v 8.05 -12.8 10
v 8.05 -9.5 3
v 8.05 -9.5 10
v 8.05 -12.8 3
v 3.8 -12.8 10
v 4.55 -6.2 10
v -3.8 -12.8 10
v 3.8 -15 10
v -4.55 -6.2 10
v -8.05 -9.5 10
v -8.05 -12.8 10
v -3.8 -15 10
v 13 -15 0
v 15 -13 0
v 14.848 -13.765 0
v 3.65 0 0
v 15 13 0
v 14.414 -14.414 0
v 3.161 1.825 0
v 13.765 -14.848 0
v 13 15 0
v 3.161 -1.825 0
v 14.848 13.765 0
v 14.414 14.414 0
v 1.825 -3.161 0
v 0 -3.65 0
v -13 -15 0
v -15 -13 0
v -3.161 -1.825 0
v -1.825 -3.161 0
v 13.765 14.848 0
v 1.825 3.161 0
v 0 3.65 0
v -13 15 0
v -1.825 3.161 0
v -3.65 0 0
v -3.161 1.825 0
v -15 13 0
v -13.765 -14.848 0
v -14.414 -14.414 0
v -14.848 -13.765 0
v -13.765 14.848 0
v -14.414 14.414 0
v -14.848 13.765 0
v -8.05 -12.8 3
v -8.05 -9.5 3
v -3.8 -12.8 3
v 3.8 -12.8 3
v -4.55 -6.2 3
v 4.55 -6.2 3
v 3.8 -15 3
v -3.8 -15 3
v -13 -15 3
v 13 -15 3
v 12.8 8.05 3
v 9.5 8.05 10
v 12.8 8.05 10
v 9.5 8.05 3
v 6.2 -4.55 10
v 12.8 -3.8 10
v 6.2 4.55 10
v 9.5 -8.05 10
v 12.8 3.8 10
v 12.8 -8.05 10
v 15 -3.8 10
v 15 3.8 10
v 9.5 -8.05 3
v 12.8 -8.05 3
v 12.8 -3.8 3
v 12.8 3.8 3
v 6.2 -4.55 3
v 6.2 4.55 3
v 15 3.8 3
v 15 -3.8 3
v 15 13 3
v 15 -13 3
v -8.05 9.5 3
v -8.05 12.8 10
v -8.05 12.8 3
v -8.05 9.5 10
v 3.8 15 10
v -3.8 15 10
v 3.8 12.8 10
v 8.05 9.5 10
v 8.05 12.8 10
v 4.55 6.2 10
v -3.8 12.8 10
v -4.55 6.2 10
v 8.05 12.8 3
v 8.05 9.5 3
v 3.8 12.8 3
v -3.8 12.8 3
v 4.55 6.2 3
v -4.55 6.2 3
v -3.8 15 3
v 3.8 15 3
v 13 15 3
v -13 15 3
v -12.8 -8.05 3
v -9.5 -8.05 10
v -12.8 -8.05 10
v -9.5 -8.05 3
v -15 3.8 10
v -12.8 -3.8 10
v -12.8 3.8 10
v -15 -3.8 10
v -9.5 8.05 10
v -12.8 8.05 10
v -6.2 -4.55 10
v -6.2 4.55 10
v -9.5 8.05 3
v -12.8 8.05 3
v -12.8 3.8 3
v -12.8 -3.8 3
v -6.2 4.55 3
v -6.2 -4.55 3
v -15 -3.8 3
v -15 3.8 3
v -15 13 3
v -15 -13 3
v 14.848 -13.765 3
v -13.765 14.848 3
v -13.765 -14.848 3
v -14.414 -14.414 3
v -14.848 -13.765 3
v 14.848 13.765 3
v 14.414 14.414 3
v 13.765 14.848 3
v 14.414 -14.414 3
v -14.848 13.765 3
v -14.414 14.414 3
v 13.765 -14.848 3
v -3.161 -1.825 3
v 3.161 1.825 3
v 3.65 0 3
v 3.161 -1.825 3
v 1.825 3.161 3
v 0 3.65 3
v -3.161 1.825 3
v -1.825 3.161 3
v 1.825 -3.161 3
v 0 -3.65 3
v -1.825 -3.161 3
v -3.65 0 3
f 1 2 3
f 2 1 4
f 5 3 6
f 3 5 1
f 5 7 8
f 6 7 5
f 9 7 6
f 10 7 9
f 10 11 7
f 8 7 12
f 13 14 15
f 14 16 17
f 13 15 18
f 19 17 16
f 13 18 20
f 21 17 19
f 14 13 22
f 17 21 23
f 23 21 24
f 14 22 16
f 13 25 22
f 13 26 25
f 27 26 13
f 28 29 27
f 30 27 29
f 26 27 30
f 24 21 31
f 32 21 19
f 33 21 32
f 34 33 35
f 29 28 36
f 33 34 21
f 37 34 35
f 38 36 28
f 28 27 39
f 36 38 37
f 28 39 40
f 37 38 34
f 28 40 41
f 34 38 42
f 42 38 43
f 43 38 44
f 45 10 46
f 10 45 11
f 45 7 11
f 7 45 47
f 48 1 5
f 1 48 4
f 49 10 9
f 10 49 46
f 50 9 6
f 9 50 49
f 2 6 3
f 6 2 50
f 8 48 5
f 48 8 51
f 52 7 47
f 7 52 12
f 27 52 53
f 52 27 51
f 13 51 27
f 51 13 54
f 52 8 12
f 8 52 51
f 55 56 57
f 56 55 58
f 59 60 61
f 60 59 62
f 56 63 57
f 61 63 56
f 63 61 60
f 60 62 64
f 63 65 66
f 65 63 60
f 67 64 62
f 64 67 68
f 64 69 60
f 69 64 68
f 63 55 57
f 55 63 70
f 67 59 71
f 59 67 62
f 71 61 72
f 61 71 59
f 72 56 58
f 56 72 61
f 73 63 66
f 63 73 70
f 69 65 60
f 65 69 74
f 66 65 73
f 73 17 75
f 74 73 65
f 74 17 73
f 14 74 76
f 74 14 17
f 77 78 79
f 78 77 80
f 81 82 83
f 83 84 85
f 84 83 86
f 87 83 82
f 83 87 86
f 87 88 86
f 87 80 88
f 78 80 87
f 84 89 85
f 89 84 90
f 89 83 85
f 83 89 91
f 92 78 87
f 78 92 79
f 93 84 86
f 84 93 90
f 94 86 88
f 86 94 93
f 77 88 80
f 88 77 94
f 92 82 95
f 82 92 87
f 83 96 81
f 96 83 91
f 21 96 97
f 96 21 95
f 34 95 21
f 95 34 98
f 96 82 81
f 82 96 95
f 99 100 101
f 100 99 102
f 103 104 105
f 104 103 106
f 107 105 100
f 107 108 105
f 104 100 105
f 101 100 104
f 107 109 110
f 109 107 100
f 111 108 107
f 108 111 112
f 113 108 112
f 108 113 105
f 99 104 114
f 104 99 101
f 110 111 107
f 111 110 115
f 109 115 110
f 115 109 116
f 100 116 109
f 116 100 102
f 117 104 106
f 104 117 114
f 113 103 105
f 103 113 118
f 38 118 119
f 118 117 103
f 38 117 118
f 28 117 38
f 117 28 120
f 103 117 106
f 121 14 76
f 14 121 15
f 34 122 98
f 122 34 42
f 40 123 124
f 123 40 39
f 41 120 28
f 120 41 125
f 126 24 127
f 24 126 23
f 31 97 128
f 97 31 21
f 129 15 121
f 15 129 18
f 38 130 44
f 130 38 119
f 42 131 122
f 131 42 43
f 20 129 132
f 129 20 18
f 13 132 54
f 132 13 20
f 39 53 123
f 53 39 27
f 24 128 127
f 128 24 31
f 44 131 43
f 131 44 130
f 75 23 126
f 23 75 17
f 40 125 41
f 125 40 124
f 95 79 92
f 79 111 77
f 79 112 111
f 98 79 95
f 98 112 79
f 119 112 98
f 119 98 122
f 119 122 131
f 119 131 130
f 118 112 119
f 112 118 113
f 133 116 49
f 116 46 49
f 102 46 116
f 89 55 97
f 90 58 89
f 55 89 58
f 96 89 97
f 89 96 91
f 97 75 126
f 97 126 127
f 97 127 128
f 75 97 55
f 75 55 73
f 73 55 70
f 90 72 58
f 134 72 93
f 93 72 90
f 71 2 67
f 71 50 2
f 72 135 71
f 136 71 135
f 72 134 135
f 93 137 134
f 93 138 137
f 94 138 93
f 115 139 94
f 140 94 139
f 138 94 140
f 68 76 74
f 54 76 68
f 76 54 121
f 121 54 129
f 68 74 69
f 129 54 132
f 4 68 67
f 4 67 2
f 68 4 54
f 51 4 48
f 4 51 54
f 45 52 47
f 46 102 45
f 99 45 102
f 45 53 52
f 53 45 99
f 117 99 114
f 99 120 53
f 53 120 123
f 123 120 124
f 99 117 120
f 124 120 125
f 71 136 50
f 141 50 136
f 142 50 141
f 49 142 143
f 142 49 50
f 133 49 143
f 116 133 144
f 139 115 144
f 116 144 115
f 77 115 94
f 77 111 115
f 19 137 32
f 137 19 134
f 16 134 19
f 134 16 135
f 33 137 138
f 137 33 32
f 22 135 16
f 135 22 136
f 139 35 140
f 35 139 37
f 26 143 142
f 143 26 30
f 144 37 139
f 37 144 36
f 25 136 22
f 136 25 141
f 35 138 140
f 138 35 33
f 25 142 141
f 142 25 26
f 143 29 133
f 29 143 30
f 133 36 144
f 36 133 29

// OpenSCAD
/* [Nominal Extrusion Dimensions] */

// Nominal width of the extrusion (i.e. 3030 = 30mm)
extrusion_width=30;

// Nominal width of the outer slot
slot_width=8.0;

// Nominal depth / height of the outer slot
slot_height=2.0;

// Nominal width of the t-slot channel at the top of the channel
tslot_top_width=16.5;

// Nominal height of the square portion of the t-slot channel
tslot_cube_height=3.5;

// Nominal height of the trapezoid portion of the t-slot channel
tslot_trap_height=3.5;

/* [End Cap Dimensions] */

// The amount of "margin" or gap around the tabs of the endcap (0.0 - need a hammer; 0.2 - snug; 0.5 - very loose)
undersize=0.2; // [0.0:0.05:0.5]

// Thickness of the cover / endcap
cover_thickness=3.0;

// Corner rounding diameter (in mm)
corner_rounding=2.0;

// Hole size (0 for no hole, otherwize specify exact desired diameter)
hole_size=7.3;

// Overall height of the tabs / inserts
tab_height=7;

/* [Hidden] */

// Nominal width of the t-slot channel at the bottom of the channel
tslot_bottom_width=tslot_top_width-tslot_trap_height*2;  // Because the angle of the trapezoid sides needs to be at 45 degrees, the triangle on each side is an isocolese triangle. Therefore the width of the top of the trapezoid is the bottom width - 2 times the height of the trapezoid


difference() {
	union() {
        
        // CREATE 4 SIDES OF COVER INSERTS
		for (a=[0:3])
			rotate([0,0,90*a])
				translate([0,-extrusion_width/2,0])
					t_slot();
		
        // CREATE COVER BASE WITH ROUNDED CORNERS
		translate([-extrusion_width/2+corner_rounding, -extrusion_width/2+corner_rounding,0])
			minkowski() {
				cube([extrusion_width-corner_rounding*2,extrusion_width-corner_rounding*2,cover_thickness-1]);
				cylinder(r=corner_rounding, h=1, $fn=16);
			}
	}
    
    // CREATE HOLE IN COVER
	cylinder(r=hole_size/2, h=cover_thickness*4, center=true);
}

module t_slot() {
    
    // CREATE SLOT
	translate([-slot_width/2+undersize,0,0])
		cube([slot_width-undersize*2, slot_height+undersize, tab_height+cover_thickness]);
    
    if (tslot_cube_height == 0) {
        
        // CREATE T-SLOT CHANNEL (TRAPEZOID SECTION)
        translate([0,slot_height+undersize,0])
            linear_extrude(height=tab_height+cover_thickness)
                trapezoid(bottom=tslot_top_width-undersize*2, top=tslot_bottom_width-undersize*2, height=tslot_trap_height-undersize*2);
        
    }
    
    else {
        
        // CREATE T-SLOT CHANNEL (CUBE SECTION)
        translate([-tslot_top_width/2+undersize,slot_height+undersize,0])
            cube([tslot_top_width-undersize*2,tslot_cube_height-undersize,tab_height+cover_thickness]);
        
        // CREATE T-SLOT CHANNEL (TRAPEZOID SECTION)
        translate([0,slot_height+tslot_cube_height,0])
            linear_extrude(height=tab_height+cover_thickness)
                trapezoid(bottom=tslot_top_width-undersize*2, top=tslot_bottom_width-undersize*2, height=tslot_trap_height-undersize);
    }
}


module trapezoid(bottom=10, top=5, height=2)
{
	polygon(points=[[-bottom/2,0],[bottom/2,0],[top/2,height],[-top/2,height]]);
}
